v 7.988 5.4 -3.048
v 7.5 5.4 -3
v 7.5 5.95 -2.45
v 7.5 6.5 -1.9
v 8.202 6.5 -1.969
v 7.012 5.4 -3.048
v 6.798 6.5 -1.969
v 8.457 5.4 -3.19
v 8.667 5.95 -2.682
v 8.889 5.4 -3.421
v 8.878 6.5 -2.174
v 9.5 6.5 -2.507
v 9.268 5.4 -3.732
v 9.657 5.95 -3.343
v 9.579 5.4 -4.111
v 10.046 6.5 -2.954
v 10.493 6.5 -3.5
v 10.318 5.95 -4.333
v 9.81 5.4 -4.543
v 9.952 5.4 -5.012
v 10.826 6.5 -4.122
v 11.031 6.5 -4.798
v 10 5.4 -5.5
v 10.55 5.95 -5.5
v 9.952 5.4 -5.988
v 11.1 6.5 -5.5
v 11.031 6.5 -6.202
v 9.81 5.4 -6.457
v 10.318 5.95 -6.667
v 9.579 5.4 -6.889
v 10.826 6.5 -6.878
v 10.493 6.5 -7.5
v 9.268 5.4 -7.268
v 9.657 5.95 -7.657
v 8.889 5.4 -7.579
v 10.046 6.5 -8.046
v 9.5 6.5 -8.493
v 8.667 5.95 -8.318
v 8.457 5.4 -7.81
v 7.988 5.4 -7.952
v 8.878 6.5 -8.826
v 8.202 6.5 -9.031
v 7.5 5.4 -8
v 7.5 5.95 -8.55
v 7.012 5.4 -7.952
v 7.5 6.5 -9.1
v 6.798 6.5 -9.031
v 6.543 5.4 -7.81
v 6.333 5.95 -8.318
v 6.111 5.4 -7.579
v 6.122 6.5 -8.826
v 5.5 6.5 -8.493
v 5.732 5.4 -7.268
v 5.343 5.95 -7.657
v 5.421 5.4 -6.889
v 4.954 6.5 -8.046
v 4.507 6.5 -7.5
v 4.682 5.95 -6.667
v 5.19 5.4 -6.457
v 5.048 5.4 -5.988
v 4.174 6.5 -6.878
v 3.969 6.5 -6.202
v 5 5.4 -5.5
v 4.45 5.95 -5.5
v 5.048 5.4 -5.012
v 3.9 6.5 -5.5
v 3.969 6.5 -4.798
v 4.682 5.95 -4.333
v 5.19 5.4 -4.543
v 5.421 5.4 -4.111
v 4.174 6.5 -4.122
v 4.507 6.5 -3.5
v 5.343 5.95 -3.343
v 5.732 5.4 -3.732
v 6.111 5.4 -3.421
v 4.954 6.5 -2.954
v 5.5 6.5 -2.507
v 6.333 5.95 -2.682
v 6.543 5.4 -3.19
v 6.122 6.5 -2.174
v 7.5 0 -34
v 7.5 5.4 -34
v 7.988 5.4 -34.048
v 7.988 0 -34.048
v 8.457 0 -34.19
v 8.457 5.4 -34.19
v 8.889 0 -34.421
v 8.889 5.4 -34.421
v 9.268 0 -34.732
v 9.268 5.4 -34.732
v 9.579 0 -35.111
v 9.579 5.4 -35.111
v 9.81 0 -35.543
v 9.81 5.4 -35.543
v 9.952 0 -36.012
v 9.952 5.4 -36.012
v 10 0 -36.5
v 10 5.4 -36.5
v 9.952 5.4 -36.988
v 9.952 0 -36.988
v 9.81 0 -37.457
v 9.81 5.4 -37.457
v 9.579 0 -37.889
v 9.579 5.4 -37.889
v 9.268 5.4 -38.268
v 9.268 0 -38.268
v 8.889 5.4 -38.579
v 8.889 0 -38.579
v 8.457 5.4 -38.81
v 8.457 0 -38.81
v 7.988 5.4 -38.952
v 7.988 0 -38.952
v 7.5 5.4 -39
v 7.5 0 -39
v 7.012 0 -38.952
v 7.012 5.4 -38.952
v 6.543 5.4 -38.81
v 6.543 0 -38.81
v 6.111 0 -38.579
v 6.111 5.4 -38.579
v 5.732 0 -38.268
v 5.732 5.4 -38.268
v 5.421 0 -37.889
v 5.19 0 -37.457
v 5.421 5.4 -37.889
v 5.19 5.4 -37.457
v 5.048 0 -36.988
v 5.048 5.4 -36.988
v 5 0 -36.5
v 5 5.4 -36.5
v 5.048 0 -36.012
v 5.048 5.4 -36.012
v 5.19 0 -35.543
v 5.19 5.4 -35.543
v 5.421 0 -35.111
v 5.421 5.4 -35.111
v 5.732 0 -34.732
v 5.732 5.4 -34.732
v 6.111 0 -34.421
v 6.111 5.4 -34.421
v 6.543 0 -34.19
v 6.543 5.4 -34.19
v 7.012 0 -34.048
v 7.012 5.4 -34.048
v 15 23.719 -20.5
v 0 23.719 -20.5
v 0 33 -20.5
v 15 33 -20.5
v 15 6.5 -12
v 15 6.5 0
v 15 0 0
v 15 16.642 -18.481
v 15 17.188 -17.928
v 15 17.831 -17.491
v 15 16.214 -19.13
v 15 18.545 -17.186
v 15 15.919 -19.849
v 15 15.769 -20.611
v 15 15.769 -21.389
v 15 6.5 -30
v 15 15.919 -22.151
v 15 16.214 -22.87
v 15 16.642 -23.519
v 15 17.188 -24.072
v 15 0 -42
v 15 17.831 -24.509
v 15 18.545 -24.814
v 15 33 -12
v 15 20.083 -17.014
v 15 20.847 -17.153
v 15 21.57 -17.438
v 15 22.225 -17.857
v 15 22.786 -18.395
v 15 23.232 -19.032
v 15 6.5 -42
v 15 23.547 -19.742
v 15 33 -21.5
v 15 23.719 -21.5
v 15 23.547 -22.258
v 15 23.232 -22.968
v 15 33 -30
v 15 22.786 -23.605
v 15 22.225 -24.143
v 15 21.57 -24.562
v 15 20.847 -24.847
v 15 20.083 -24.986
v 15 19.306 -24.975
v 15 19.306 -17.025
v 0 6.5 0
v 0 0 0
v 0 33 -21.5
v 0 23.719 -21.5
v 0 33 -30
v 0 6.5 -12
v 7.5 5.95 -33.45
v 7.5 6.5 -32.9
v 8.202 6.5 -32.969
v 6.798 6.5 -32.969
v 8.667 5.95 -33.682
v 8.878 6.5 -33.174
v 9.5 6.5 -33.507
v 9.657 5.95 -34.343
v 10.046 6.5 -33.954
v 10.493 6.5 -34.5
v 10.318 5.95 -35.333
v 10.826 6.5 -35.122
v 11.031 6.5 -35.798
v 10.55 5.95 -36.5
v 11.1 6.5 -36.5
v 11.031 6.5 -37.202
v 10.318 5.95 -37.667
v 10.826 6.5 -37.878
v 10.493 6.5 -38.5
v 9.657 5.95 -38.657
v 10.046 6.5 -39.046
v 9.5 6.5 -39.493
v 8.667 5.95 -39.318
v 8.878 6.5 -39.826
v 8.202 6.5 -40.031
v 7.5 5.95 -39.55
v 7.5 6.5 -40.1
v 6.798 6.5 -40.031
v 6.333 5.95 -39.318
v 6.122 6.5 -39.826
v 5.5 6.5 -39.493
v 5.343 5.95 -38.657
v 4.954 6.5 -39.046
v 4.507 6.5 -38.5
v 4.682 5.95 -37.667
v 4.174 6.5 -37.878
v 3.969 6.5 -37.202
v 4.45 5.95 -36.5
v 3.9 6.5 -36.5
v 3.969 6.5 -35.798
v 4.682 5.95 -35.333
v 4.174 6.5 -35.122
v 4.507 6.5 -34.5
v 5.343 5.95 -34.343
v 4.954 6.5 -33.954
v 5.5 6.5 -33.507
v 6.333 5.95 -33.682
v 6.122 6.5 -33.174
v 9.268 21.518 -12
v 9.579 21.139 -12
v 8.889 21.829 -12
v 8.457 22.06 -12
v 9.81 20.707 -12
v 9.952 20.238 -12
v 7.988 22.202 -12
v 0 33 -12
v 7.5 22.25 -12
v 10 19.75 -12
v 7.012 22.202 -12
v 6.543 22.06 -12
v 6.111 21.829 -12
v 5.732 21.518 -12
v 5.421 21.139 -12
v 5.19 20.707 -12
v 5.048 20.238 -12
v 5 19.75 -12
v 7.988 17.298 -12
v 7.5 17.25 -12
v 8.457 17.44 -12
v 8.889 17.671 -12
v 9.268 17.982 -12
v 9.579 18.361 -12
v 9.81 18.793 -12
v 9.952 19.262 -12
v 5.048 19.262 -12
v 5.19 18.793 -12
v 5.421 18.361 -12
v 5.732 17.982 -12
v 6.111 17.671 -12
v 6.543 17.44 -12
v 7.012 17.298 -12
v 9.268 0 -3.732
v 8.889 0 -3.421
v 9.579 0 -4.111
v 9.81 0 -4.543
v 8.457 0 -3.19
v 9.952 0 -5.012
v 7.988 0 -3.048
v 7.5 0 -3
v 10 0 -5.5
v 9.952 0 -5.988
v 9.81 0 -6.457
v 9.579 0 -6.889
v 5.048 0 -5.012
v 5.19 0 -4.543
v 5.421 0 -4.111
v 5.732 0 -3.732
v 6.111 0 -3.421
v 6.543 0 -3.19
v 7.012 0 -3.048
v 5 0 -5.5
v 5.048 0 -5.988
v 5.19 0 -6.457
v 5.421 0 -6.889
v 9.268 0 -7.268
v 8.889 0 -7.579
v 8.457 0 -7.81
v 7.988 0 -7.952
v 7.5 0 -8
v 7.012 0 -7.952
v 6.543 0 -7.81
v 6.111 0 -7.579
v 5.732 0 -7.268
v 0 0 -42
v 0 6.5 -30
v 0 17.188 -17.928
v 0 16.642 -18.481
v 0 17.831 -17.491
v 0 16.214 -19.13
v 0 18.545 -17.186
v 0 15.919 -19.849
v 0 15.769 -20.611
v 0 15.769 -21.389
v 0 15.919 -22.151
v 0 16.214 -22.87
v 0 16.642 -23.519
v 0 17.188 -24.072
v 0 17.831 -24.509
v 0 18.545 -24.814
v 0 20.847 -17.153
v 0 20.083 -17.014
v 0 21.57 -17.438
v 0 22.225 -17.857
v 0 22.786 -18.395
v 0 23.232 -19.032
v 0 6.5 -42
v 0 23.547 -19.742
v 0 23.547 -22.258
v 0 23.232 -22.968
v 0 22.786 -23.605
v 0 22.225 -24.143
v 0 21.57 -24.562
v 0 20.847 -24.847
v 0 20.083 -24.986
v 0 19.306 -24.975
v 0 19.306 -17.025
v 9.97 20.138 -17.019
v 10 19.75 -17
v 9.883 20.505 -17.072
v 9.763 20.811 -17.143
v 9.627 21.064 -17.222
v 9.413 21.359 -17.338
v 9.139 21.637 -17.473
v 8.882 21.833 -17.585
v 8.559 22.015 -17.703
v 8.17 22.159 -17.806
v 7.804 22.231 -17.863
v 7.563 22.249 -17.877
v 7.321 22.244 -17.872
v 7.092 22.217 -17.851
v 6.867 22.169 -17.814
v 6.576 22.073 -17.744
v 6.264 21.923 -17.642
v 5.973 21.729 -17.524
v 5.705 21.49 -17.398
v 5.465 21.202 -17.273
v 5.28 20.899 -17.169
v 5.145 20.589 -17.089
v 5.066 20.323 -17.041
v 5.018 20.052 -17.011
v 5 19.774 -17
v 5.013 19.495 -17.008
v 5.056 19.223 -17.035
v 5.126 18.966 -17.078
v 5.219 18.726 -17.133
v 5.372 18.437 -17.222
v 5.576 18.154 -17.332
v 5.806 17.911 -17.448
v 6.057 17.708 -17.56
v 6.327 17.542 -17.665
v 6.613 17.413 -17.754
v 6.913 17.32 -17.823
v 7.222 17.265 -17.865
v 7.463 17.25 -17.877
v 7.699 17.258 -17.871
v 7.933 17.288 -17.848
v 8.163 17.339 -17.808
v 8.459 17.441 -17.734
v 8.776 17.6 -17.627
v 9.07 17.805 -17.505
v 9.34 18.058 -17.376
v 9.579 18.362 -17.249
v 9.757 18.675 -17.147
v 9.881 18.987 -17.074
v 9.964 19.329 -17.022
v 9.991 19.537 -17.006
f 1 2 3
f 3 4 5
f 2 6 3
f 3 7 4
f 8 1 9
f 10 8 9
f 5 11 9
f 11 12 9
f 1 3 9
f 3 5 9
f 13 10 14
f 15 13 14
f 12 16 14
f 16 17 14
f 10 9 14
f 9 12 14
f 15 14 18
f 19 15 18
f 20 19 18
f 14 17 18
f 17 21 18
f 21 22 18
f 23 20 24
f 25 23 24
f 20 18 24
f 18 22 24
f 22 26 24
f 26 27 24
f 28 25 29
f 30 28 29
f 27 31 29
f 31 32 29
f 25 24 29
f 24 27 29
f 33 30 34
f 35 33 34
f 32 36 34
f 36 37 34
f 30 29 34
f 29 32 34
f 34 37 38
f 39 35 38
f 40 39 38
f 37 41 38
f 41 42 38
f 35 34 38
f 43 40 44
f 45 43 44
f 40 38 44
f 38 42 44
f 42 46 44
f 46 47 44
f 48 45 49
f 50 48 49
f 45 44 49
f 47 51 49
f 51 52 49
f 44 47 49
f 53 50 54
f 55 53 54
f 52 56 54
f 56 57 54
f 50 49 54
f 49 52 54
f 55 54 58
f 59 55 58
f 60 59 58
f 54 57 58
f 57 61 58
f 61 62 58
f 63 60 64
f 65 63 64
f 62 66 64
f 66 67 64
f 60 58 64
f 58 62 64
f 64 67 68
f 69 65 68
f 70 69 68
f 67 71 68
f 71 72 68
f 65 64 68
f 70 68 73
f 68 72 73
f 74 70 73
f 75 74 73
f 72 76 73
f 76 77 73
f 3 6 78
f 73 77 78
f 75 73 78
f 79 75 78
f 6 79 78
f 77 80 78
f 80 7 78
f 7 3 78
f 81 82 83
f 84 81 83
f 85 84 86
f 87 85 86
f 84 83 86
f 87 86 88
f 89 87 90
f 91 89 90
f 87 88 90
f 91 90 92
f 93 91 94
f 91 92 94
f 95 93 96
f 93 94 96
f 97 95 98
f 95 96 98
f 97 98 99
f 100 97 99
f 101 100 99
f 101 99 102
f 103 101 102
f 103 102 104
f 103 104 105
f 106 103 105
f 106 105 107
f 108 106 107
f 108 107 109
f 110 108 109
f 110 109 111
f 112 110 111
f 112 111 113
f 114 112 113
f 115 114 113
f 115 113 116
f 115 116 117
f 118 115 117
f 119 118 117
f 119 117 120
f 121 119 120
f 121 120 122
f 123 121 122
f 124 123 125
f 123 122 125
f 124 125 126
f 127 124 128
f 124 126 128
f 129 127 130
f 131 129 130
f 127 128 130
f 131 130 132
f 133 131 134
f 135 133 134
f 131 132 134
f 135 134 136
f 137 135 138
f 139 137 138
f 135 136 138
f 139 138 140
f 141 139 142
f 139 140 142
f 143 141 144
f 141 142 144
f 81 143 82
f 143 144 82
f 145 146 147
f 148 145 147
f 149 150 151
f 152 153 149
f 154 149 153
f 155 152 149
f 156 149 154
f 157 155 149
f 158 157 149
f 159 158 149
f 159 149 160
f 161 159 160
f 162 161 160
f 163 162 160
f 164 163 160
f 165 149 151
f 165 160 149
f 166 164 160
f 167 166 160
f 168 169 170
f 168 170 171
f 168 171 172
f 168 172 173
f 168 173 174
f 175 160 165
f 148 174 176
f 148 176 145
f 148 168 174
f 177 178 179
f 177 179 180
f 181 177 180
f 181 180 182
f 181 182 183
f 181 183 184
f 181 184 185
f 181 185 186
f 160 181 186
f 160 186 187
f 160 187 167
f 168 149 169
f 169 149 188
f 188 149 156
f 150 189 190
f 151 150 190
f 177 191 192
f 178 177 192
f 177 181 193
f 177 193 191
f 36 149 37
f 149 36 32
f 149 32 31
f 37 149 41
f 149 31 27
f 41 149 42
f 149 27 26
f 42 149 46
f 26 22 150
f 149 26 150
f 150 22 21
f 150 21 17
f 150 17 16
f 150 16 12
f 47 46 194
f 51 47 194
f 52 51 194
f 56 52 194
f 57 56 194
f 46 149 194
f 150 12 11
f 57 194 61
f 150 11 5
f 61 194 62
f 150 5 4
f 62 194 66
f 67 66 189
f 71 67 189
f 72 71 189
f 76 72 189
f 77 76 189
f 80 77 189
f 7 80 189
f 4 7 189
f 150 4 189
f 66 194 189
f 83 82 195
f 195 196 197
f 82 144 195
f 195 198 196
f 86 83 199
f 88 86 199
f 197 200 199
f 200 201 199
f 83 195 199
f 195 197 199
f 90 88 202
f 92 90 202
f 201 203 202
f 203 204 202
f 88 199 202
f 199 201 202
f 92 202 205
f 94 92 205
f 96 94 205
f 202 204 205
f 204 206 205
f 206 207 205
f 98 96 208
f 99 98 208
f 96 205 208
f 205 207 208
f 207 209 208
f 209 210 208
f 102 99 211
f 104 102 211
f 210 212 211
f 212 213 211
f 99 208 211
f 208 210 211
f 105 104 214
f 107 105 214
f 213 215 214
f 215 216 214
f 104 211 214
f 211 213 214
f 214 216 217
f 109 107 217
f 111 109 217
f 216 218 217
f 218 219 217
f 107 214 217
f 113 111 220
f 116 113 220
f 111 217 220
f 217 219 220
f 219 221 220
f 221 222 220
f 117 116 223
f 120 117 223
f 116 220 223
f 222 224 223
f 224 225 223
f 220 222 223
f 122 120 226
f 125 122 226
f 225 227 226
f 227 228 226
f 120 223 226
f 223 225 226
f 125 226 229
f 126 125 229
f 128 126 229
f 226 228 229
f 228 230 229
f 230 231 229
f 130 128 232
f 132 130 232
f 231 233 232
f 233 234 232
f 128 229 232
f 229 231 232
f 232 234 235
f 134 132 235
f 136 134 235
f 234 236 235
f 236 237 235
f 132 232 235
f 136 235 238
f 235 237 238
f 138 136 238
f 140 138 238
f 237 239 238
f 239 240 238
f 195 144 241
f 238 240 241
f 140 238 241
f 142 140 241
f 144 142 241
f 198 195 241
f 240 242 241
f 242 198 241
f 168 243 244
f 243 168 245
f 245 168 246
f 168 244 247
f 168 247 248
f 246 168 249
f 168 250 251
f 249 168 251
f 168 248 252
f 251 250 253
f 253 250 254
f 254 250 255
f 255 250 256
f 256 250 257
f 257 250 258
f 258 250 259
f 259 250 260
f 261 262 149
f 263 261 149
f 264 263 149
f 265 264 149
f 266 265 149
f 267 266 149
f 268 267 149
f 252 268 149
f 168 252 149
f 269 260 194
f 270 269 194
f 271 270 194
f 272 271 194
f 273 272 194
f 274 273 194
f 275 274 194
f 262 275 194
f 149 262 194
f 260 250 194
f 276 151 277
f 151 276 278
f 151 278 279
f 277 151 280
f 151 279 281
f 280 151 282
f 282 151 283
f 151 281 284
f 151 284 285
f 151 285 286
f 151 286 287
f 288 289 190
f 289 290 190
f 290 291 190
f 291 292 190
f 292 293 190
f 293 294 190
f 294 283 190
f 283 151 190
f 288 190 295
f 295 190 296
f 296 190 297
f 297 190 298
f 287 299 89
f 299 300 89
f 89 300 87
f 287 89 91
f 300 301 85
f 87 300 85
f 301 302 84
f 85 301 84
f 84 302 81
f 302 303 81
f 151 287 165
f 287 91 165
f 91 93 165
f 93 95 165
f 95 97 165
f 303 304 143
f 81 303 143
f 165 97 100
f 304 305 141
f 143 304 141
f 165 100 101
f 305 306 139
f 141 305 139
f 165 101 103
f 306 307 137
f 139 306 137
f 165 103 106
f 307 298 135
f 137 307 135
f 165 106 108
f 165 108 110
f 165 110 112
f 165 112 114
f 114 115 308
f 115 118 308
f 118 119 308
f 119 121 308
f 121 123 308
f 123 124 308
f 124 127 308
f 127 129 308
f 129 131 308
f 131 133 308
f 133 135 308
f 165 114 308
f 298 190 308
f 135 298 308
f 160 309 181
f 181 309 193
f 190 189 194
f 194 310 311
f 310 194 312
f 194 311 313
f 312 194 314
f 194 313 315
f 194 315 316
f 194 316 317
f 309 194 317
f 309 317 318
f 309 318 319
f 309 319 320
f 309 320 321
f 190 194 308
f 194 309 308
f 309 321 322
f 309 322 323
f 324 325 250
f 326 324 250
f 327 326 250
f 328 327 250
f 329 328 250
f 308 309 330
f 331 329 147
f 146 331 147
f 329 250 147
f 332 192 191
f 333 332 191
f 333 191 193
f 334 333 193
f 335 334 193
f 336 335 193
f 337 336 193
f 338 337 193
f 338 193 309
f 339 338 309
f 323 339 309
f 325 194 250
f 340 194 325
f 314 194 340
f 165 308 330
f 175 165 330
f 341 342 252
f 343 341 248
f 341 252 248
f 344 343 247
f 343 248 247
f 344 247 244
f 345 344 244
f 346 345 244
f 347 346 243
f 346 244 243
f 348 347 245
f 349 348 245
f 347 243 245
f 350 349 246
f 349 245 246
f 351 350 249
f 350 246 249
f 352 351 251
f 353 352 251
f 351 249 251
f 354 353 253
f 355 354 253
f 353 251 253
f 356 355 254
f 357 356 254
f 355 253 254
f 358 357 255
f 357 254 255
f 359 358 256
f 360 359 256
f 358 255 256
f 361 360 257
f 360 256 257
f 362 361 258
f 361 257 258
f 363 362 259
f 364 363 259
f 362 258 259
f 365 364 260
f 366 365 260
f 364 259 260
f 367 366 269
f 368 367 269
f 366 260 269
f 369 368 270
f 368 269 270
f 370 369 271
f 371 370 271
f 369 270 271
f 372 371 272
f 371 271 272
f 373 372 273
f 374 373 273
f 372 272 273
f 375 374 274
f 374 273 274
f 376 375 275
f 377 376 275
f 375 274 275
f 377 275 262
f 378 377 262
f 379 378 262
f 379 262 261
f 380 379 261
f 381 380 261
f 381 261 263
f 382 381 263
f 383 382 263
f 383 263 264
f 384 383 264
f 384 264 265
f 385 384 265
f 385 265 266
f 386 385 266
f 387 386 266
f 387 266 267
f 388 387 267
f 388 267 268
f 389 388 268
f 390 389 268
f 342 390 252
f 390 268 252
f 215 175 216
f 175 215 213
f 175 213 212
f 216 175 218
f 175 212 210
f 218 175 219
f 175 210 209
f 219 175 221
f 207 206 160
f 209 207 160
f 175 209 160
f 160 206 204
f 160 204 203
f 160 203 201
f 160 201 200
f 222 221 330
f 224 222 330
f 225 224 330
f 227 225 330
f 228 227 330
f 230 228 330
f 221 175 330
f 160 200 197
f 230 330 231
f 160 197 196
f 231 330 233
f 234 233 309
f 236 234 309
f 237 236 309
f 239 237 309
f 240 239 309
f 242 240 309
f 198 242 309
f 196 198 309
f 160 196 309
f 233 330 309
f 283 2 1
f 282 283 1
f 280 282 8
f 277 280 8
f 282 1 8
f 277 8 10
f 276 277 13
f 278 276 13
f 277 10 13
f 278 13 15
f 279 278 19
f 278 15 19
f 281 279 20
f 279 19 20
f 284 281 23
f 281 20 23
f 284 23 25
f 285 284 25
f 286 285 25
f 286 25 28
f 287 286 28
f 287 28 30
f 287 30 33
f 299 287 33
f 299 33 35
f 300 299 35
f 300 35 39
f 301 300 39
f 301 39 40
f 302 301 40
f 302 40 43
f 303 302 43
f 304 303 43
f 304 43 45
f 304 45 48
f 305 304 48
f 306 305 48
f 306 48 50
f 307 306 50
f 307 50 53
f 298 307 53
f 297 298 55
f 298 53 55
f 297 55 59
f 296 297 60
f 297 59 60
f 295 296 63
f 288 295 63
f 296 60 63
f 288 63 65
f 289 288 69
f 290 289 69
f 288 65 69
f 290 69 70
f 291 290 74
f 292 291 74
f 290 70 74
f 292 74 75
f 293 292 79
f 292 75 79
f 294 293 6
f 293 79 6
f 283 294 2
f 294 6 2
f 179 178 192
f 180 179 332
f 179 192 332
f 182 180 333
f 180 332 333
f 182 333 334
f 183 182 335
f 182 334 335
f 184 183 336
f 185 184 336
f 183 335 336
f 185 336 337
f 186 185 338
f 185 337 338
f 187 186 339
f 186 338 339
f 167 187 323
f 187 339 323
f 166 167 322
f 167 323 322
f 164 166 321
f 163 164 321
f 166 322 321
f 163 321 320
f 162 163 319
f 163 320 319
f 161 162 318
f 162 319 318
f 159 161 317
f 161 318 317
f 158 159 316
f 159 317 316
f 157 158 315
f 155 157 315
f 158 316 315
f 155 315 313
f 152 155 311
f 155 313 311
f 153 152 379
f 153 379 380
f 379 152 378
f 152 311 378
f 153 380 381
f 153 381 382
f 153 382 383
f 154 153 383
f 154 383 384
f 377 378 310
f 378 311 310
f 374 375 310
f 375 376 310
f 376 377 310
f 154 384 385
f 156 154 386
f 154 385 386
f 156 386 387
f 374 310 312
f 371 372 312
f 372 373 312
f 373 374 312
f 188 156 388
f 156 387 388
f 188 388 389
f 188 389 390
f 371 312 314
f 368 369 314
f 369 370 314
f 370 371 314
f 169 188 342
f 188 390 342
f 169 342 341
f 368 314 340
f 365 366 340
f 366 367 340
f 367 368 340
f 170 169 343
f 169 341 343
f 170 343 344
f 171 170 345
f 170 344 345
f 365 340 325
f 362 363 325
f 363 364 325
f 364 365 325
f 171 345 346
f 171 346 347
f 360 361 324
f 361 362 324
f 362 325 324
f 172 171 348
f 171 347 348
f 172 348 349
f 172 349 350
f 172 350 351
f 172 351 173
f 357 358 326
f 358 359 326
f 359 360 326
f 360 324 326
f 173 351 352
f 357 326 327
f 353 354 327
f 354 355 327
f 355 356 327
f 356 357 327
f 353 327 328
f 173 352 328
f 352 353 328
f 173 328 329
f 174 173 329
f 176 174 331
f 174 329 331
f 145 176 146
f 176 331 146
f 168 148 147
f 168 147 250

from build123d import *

# Parameters (mm, degrees)
PROFILEBOSS_EXTRUDE1_DEPTH         = 15
SKETCH2_R                          = 2.5
MOUNTHOLESCUT_EXTRUDE1_DEPTH       = 52.877258987
CHAMFER1_SIZE                      = 1.1
GROMMETHOLECUT_EXTRUDE2_REACH      = 49.053
GROMMETHOLECUT_EXTRUDE2_END_RADIUS = 4
SKETCH3_R                          = 2.5


with BuildPart() as part:
    # Sketch1 → ProfileBoss-Extrude1 (new body)
    with BuildSketch(Plane(origin=(0, 0, 0), x_dir=(0, 0, -1), z_dir=(1, 0, 0))):
        with BuildLine():
            Line((0, 0), (42, 0))
            Line((42, 0), (42, 6.5))
            Line((42, 6.5), (30, 6.5))
            Line((30, 6.5), (30, 33))
            Line((30, 33), (21.5, 33))
            Line((21.5, 33), (21.5, 23.718626967))
            ThreePointArc((21.5, 23.718626967), (21, 15.75), (20.5, 23.718626967))
            Line((20.5, 23.718626967), (20.5, 33))
            Line((20.5, 33), (12, 33))
            Line((12, 33), (12, 6.5))
            Line((12, 6.5), (0, 6.5))
            Line((0, 6.5), (0, 0))
        make_face()
    extrude(amount=PROFILEBOSS_EXTRUDE1_DEPTH)

    # Sketch2 → MountHolesCut-Extrude1 (cut, through all)
    with BuildSketch(Plane(origin=(0, 6.5, 0), x_dir=(1, 0, 0), z_dir=(0, 1, 0))):
        with Locations(Location((7.5, 5.5, 0), (0, 0, 270))):
            Circle(SKETCH2_R)
        with Locations(Location((7.5, 36.5, 0), (0, 0, 270))):
            Circle(SKETCH2_R)
    extrude(amount=-MOUNTHOLESCUT_EXTRUDE1_DEPTH, mode=Mode.SUBTRACT)

    # Chamfer1
    chamfer1_edges = [part.edges().sort_by_distance(p)[0] for p in [
        (7.5, 6.5, -8),
        (7.5, 6.5, -39),
    ]]
    chamfer(chamfer1_edges, length=CHAMFER1_SIZE)

    # GrommetHoleCut-Extrude2: up to this cylinder (the profile starts outside it)
    grommetholecut_extrude2_end = Plane(origin=(7.5, 19.75, -21), z_dir=(-1, 0, 0)) * Cylinder(GROMMETHOLECUT_EXTRUDE2_END_RADIUS, 107.106, mode=Mode.PRIVATE)
    # Sketch3 → GrommetHoleCut-Extrude2 (cut, up to the surface)
    with BuildSketch(Plane.XY.offset(-12), mode=Mode.PRIVATE) as grommetholecut_extrude2_sk1:
        with Locations((7.5, 19.75)):
            Circle(SKETCH3_R)
    grommetholecut_extrude2_tool1 = extrude(grommetholecut_extrude2_sk1.sketch, amount=-GROMMETHOLECUT_EXTRUDE2_REACH, mode=Mode.PRIVATE) - grommetholecut_extrude2_end
    add(grommetholecut_extrude2_tool1.solids().sort_by_distance((7.5, 19.75, -12))[0], mode=Mode.SUBTRACT)


solid = part.part
